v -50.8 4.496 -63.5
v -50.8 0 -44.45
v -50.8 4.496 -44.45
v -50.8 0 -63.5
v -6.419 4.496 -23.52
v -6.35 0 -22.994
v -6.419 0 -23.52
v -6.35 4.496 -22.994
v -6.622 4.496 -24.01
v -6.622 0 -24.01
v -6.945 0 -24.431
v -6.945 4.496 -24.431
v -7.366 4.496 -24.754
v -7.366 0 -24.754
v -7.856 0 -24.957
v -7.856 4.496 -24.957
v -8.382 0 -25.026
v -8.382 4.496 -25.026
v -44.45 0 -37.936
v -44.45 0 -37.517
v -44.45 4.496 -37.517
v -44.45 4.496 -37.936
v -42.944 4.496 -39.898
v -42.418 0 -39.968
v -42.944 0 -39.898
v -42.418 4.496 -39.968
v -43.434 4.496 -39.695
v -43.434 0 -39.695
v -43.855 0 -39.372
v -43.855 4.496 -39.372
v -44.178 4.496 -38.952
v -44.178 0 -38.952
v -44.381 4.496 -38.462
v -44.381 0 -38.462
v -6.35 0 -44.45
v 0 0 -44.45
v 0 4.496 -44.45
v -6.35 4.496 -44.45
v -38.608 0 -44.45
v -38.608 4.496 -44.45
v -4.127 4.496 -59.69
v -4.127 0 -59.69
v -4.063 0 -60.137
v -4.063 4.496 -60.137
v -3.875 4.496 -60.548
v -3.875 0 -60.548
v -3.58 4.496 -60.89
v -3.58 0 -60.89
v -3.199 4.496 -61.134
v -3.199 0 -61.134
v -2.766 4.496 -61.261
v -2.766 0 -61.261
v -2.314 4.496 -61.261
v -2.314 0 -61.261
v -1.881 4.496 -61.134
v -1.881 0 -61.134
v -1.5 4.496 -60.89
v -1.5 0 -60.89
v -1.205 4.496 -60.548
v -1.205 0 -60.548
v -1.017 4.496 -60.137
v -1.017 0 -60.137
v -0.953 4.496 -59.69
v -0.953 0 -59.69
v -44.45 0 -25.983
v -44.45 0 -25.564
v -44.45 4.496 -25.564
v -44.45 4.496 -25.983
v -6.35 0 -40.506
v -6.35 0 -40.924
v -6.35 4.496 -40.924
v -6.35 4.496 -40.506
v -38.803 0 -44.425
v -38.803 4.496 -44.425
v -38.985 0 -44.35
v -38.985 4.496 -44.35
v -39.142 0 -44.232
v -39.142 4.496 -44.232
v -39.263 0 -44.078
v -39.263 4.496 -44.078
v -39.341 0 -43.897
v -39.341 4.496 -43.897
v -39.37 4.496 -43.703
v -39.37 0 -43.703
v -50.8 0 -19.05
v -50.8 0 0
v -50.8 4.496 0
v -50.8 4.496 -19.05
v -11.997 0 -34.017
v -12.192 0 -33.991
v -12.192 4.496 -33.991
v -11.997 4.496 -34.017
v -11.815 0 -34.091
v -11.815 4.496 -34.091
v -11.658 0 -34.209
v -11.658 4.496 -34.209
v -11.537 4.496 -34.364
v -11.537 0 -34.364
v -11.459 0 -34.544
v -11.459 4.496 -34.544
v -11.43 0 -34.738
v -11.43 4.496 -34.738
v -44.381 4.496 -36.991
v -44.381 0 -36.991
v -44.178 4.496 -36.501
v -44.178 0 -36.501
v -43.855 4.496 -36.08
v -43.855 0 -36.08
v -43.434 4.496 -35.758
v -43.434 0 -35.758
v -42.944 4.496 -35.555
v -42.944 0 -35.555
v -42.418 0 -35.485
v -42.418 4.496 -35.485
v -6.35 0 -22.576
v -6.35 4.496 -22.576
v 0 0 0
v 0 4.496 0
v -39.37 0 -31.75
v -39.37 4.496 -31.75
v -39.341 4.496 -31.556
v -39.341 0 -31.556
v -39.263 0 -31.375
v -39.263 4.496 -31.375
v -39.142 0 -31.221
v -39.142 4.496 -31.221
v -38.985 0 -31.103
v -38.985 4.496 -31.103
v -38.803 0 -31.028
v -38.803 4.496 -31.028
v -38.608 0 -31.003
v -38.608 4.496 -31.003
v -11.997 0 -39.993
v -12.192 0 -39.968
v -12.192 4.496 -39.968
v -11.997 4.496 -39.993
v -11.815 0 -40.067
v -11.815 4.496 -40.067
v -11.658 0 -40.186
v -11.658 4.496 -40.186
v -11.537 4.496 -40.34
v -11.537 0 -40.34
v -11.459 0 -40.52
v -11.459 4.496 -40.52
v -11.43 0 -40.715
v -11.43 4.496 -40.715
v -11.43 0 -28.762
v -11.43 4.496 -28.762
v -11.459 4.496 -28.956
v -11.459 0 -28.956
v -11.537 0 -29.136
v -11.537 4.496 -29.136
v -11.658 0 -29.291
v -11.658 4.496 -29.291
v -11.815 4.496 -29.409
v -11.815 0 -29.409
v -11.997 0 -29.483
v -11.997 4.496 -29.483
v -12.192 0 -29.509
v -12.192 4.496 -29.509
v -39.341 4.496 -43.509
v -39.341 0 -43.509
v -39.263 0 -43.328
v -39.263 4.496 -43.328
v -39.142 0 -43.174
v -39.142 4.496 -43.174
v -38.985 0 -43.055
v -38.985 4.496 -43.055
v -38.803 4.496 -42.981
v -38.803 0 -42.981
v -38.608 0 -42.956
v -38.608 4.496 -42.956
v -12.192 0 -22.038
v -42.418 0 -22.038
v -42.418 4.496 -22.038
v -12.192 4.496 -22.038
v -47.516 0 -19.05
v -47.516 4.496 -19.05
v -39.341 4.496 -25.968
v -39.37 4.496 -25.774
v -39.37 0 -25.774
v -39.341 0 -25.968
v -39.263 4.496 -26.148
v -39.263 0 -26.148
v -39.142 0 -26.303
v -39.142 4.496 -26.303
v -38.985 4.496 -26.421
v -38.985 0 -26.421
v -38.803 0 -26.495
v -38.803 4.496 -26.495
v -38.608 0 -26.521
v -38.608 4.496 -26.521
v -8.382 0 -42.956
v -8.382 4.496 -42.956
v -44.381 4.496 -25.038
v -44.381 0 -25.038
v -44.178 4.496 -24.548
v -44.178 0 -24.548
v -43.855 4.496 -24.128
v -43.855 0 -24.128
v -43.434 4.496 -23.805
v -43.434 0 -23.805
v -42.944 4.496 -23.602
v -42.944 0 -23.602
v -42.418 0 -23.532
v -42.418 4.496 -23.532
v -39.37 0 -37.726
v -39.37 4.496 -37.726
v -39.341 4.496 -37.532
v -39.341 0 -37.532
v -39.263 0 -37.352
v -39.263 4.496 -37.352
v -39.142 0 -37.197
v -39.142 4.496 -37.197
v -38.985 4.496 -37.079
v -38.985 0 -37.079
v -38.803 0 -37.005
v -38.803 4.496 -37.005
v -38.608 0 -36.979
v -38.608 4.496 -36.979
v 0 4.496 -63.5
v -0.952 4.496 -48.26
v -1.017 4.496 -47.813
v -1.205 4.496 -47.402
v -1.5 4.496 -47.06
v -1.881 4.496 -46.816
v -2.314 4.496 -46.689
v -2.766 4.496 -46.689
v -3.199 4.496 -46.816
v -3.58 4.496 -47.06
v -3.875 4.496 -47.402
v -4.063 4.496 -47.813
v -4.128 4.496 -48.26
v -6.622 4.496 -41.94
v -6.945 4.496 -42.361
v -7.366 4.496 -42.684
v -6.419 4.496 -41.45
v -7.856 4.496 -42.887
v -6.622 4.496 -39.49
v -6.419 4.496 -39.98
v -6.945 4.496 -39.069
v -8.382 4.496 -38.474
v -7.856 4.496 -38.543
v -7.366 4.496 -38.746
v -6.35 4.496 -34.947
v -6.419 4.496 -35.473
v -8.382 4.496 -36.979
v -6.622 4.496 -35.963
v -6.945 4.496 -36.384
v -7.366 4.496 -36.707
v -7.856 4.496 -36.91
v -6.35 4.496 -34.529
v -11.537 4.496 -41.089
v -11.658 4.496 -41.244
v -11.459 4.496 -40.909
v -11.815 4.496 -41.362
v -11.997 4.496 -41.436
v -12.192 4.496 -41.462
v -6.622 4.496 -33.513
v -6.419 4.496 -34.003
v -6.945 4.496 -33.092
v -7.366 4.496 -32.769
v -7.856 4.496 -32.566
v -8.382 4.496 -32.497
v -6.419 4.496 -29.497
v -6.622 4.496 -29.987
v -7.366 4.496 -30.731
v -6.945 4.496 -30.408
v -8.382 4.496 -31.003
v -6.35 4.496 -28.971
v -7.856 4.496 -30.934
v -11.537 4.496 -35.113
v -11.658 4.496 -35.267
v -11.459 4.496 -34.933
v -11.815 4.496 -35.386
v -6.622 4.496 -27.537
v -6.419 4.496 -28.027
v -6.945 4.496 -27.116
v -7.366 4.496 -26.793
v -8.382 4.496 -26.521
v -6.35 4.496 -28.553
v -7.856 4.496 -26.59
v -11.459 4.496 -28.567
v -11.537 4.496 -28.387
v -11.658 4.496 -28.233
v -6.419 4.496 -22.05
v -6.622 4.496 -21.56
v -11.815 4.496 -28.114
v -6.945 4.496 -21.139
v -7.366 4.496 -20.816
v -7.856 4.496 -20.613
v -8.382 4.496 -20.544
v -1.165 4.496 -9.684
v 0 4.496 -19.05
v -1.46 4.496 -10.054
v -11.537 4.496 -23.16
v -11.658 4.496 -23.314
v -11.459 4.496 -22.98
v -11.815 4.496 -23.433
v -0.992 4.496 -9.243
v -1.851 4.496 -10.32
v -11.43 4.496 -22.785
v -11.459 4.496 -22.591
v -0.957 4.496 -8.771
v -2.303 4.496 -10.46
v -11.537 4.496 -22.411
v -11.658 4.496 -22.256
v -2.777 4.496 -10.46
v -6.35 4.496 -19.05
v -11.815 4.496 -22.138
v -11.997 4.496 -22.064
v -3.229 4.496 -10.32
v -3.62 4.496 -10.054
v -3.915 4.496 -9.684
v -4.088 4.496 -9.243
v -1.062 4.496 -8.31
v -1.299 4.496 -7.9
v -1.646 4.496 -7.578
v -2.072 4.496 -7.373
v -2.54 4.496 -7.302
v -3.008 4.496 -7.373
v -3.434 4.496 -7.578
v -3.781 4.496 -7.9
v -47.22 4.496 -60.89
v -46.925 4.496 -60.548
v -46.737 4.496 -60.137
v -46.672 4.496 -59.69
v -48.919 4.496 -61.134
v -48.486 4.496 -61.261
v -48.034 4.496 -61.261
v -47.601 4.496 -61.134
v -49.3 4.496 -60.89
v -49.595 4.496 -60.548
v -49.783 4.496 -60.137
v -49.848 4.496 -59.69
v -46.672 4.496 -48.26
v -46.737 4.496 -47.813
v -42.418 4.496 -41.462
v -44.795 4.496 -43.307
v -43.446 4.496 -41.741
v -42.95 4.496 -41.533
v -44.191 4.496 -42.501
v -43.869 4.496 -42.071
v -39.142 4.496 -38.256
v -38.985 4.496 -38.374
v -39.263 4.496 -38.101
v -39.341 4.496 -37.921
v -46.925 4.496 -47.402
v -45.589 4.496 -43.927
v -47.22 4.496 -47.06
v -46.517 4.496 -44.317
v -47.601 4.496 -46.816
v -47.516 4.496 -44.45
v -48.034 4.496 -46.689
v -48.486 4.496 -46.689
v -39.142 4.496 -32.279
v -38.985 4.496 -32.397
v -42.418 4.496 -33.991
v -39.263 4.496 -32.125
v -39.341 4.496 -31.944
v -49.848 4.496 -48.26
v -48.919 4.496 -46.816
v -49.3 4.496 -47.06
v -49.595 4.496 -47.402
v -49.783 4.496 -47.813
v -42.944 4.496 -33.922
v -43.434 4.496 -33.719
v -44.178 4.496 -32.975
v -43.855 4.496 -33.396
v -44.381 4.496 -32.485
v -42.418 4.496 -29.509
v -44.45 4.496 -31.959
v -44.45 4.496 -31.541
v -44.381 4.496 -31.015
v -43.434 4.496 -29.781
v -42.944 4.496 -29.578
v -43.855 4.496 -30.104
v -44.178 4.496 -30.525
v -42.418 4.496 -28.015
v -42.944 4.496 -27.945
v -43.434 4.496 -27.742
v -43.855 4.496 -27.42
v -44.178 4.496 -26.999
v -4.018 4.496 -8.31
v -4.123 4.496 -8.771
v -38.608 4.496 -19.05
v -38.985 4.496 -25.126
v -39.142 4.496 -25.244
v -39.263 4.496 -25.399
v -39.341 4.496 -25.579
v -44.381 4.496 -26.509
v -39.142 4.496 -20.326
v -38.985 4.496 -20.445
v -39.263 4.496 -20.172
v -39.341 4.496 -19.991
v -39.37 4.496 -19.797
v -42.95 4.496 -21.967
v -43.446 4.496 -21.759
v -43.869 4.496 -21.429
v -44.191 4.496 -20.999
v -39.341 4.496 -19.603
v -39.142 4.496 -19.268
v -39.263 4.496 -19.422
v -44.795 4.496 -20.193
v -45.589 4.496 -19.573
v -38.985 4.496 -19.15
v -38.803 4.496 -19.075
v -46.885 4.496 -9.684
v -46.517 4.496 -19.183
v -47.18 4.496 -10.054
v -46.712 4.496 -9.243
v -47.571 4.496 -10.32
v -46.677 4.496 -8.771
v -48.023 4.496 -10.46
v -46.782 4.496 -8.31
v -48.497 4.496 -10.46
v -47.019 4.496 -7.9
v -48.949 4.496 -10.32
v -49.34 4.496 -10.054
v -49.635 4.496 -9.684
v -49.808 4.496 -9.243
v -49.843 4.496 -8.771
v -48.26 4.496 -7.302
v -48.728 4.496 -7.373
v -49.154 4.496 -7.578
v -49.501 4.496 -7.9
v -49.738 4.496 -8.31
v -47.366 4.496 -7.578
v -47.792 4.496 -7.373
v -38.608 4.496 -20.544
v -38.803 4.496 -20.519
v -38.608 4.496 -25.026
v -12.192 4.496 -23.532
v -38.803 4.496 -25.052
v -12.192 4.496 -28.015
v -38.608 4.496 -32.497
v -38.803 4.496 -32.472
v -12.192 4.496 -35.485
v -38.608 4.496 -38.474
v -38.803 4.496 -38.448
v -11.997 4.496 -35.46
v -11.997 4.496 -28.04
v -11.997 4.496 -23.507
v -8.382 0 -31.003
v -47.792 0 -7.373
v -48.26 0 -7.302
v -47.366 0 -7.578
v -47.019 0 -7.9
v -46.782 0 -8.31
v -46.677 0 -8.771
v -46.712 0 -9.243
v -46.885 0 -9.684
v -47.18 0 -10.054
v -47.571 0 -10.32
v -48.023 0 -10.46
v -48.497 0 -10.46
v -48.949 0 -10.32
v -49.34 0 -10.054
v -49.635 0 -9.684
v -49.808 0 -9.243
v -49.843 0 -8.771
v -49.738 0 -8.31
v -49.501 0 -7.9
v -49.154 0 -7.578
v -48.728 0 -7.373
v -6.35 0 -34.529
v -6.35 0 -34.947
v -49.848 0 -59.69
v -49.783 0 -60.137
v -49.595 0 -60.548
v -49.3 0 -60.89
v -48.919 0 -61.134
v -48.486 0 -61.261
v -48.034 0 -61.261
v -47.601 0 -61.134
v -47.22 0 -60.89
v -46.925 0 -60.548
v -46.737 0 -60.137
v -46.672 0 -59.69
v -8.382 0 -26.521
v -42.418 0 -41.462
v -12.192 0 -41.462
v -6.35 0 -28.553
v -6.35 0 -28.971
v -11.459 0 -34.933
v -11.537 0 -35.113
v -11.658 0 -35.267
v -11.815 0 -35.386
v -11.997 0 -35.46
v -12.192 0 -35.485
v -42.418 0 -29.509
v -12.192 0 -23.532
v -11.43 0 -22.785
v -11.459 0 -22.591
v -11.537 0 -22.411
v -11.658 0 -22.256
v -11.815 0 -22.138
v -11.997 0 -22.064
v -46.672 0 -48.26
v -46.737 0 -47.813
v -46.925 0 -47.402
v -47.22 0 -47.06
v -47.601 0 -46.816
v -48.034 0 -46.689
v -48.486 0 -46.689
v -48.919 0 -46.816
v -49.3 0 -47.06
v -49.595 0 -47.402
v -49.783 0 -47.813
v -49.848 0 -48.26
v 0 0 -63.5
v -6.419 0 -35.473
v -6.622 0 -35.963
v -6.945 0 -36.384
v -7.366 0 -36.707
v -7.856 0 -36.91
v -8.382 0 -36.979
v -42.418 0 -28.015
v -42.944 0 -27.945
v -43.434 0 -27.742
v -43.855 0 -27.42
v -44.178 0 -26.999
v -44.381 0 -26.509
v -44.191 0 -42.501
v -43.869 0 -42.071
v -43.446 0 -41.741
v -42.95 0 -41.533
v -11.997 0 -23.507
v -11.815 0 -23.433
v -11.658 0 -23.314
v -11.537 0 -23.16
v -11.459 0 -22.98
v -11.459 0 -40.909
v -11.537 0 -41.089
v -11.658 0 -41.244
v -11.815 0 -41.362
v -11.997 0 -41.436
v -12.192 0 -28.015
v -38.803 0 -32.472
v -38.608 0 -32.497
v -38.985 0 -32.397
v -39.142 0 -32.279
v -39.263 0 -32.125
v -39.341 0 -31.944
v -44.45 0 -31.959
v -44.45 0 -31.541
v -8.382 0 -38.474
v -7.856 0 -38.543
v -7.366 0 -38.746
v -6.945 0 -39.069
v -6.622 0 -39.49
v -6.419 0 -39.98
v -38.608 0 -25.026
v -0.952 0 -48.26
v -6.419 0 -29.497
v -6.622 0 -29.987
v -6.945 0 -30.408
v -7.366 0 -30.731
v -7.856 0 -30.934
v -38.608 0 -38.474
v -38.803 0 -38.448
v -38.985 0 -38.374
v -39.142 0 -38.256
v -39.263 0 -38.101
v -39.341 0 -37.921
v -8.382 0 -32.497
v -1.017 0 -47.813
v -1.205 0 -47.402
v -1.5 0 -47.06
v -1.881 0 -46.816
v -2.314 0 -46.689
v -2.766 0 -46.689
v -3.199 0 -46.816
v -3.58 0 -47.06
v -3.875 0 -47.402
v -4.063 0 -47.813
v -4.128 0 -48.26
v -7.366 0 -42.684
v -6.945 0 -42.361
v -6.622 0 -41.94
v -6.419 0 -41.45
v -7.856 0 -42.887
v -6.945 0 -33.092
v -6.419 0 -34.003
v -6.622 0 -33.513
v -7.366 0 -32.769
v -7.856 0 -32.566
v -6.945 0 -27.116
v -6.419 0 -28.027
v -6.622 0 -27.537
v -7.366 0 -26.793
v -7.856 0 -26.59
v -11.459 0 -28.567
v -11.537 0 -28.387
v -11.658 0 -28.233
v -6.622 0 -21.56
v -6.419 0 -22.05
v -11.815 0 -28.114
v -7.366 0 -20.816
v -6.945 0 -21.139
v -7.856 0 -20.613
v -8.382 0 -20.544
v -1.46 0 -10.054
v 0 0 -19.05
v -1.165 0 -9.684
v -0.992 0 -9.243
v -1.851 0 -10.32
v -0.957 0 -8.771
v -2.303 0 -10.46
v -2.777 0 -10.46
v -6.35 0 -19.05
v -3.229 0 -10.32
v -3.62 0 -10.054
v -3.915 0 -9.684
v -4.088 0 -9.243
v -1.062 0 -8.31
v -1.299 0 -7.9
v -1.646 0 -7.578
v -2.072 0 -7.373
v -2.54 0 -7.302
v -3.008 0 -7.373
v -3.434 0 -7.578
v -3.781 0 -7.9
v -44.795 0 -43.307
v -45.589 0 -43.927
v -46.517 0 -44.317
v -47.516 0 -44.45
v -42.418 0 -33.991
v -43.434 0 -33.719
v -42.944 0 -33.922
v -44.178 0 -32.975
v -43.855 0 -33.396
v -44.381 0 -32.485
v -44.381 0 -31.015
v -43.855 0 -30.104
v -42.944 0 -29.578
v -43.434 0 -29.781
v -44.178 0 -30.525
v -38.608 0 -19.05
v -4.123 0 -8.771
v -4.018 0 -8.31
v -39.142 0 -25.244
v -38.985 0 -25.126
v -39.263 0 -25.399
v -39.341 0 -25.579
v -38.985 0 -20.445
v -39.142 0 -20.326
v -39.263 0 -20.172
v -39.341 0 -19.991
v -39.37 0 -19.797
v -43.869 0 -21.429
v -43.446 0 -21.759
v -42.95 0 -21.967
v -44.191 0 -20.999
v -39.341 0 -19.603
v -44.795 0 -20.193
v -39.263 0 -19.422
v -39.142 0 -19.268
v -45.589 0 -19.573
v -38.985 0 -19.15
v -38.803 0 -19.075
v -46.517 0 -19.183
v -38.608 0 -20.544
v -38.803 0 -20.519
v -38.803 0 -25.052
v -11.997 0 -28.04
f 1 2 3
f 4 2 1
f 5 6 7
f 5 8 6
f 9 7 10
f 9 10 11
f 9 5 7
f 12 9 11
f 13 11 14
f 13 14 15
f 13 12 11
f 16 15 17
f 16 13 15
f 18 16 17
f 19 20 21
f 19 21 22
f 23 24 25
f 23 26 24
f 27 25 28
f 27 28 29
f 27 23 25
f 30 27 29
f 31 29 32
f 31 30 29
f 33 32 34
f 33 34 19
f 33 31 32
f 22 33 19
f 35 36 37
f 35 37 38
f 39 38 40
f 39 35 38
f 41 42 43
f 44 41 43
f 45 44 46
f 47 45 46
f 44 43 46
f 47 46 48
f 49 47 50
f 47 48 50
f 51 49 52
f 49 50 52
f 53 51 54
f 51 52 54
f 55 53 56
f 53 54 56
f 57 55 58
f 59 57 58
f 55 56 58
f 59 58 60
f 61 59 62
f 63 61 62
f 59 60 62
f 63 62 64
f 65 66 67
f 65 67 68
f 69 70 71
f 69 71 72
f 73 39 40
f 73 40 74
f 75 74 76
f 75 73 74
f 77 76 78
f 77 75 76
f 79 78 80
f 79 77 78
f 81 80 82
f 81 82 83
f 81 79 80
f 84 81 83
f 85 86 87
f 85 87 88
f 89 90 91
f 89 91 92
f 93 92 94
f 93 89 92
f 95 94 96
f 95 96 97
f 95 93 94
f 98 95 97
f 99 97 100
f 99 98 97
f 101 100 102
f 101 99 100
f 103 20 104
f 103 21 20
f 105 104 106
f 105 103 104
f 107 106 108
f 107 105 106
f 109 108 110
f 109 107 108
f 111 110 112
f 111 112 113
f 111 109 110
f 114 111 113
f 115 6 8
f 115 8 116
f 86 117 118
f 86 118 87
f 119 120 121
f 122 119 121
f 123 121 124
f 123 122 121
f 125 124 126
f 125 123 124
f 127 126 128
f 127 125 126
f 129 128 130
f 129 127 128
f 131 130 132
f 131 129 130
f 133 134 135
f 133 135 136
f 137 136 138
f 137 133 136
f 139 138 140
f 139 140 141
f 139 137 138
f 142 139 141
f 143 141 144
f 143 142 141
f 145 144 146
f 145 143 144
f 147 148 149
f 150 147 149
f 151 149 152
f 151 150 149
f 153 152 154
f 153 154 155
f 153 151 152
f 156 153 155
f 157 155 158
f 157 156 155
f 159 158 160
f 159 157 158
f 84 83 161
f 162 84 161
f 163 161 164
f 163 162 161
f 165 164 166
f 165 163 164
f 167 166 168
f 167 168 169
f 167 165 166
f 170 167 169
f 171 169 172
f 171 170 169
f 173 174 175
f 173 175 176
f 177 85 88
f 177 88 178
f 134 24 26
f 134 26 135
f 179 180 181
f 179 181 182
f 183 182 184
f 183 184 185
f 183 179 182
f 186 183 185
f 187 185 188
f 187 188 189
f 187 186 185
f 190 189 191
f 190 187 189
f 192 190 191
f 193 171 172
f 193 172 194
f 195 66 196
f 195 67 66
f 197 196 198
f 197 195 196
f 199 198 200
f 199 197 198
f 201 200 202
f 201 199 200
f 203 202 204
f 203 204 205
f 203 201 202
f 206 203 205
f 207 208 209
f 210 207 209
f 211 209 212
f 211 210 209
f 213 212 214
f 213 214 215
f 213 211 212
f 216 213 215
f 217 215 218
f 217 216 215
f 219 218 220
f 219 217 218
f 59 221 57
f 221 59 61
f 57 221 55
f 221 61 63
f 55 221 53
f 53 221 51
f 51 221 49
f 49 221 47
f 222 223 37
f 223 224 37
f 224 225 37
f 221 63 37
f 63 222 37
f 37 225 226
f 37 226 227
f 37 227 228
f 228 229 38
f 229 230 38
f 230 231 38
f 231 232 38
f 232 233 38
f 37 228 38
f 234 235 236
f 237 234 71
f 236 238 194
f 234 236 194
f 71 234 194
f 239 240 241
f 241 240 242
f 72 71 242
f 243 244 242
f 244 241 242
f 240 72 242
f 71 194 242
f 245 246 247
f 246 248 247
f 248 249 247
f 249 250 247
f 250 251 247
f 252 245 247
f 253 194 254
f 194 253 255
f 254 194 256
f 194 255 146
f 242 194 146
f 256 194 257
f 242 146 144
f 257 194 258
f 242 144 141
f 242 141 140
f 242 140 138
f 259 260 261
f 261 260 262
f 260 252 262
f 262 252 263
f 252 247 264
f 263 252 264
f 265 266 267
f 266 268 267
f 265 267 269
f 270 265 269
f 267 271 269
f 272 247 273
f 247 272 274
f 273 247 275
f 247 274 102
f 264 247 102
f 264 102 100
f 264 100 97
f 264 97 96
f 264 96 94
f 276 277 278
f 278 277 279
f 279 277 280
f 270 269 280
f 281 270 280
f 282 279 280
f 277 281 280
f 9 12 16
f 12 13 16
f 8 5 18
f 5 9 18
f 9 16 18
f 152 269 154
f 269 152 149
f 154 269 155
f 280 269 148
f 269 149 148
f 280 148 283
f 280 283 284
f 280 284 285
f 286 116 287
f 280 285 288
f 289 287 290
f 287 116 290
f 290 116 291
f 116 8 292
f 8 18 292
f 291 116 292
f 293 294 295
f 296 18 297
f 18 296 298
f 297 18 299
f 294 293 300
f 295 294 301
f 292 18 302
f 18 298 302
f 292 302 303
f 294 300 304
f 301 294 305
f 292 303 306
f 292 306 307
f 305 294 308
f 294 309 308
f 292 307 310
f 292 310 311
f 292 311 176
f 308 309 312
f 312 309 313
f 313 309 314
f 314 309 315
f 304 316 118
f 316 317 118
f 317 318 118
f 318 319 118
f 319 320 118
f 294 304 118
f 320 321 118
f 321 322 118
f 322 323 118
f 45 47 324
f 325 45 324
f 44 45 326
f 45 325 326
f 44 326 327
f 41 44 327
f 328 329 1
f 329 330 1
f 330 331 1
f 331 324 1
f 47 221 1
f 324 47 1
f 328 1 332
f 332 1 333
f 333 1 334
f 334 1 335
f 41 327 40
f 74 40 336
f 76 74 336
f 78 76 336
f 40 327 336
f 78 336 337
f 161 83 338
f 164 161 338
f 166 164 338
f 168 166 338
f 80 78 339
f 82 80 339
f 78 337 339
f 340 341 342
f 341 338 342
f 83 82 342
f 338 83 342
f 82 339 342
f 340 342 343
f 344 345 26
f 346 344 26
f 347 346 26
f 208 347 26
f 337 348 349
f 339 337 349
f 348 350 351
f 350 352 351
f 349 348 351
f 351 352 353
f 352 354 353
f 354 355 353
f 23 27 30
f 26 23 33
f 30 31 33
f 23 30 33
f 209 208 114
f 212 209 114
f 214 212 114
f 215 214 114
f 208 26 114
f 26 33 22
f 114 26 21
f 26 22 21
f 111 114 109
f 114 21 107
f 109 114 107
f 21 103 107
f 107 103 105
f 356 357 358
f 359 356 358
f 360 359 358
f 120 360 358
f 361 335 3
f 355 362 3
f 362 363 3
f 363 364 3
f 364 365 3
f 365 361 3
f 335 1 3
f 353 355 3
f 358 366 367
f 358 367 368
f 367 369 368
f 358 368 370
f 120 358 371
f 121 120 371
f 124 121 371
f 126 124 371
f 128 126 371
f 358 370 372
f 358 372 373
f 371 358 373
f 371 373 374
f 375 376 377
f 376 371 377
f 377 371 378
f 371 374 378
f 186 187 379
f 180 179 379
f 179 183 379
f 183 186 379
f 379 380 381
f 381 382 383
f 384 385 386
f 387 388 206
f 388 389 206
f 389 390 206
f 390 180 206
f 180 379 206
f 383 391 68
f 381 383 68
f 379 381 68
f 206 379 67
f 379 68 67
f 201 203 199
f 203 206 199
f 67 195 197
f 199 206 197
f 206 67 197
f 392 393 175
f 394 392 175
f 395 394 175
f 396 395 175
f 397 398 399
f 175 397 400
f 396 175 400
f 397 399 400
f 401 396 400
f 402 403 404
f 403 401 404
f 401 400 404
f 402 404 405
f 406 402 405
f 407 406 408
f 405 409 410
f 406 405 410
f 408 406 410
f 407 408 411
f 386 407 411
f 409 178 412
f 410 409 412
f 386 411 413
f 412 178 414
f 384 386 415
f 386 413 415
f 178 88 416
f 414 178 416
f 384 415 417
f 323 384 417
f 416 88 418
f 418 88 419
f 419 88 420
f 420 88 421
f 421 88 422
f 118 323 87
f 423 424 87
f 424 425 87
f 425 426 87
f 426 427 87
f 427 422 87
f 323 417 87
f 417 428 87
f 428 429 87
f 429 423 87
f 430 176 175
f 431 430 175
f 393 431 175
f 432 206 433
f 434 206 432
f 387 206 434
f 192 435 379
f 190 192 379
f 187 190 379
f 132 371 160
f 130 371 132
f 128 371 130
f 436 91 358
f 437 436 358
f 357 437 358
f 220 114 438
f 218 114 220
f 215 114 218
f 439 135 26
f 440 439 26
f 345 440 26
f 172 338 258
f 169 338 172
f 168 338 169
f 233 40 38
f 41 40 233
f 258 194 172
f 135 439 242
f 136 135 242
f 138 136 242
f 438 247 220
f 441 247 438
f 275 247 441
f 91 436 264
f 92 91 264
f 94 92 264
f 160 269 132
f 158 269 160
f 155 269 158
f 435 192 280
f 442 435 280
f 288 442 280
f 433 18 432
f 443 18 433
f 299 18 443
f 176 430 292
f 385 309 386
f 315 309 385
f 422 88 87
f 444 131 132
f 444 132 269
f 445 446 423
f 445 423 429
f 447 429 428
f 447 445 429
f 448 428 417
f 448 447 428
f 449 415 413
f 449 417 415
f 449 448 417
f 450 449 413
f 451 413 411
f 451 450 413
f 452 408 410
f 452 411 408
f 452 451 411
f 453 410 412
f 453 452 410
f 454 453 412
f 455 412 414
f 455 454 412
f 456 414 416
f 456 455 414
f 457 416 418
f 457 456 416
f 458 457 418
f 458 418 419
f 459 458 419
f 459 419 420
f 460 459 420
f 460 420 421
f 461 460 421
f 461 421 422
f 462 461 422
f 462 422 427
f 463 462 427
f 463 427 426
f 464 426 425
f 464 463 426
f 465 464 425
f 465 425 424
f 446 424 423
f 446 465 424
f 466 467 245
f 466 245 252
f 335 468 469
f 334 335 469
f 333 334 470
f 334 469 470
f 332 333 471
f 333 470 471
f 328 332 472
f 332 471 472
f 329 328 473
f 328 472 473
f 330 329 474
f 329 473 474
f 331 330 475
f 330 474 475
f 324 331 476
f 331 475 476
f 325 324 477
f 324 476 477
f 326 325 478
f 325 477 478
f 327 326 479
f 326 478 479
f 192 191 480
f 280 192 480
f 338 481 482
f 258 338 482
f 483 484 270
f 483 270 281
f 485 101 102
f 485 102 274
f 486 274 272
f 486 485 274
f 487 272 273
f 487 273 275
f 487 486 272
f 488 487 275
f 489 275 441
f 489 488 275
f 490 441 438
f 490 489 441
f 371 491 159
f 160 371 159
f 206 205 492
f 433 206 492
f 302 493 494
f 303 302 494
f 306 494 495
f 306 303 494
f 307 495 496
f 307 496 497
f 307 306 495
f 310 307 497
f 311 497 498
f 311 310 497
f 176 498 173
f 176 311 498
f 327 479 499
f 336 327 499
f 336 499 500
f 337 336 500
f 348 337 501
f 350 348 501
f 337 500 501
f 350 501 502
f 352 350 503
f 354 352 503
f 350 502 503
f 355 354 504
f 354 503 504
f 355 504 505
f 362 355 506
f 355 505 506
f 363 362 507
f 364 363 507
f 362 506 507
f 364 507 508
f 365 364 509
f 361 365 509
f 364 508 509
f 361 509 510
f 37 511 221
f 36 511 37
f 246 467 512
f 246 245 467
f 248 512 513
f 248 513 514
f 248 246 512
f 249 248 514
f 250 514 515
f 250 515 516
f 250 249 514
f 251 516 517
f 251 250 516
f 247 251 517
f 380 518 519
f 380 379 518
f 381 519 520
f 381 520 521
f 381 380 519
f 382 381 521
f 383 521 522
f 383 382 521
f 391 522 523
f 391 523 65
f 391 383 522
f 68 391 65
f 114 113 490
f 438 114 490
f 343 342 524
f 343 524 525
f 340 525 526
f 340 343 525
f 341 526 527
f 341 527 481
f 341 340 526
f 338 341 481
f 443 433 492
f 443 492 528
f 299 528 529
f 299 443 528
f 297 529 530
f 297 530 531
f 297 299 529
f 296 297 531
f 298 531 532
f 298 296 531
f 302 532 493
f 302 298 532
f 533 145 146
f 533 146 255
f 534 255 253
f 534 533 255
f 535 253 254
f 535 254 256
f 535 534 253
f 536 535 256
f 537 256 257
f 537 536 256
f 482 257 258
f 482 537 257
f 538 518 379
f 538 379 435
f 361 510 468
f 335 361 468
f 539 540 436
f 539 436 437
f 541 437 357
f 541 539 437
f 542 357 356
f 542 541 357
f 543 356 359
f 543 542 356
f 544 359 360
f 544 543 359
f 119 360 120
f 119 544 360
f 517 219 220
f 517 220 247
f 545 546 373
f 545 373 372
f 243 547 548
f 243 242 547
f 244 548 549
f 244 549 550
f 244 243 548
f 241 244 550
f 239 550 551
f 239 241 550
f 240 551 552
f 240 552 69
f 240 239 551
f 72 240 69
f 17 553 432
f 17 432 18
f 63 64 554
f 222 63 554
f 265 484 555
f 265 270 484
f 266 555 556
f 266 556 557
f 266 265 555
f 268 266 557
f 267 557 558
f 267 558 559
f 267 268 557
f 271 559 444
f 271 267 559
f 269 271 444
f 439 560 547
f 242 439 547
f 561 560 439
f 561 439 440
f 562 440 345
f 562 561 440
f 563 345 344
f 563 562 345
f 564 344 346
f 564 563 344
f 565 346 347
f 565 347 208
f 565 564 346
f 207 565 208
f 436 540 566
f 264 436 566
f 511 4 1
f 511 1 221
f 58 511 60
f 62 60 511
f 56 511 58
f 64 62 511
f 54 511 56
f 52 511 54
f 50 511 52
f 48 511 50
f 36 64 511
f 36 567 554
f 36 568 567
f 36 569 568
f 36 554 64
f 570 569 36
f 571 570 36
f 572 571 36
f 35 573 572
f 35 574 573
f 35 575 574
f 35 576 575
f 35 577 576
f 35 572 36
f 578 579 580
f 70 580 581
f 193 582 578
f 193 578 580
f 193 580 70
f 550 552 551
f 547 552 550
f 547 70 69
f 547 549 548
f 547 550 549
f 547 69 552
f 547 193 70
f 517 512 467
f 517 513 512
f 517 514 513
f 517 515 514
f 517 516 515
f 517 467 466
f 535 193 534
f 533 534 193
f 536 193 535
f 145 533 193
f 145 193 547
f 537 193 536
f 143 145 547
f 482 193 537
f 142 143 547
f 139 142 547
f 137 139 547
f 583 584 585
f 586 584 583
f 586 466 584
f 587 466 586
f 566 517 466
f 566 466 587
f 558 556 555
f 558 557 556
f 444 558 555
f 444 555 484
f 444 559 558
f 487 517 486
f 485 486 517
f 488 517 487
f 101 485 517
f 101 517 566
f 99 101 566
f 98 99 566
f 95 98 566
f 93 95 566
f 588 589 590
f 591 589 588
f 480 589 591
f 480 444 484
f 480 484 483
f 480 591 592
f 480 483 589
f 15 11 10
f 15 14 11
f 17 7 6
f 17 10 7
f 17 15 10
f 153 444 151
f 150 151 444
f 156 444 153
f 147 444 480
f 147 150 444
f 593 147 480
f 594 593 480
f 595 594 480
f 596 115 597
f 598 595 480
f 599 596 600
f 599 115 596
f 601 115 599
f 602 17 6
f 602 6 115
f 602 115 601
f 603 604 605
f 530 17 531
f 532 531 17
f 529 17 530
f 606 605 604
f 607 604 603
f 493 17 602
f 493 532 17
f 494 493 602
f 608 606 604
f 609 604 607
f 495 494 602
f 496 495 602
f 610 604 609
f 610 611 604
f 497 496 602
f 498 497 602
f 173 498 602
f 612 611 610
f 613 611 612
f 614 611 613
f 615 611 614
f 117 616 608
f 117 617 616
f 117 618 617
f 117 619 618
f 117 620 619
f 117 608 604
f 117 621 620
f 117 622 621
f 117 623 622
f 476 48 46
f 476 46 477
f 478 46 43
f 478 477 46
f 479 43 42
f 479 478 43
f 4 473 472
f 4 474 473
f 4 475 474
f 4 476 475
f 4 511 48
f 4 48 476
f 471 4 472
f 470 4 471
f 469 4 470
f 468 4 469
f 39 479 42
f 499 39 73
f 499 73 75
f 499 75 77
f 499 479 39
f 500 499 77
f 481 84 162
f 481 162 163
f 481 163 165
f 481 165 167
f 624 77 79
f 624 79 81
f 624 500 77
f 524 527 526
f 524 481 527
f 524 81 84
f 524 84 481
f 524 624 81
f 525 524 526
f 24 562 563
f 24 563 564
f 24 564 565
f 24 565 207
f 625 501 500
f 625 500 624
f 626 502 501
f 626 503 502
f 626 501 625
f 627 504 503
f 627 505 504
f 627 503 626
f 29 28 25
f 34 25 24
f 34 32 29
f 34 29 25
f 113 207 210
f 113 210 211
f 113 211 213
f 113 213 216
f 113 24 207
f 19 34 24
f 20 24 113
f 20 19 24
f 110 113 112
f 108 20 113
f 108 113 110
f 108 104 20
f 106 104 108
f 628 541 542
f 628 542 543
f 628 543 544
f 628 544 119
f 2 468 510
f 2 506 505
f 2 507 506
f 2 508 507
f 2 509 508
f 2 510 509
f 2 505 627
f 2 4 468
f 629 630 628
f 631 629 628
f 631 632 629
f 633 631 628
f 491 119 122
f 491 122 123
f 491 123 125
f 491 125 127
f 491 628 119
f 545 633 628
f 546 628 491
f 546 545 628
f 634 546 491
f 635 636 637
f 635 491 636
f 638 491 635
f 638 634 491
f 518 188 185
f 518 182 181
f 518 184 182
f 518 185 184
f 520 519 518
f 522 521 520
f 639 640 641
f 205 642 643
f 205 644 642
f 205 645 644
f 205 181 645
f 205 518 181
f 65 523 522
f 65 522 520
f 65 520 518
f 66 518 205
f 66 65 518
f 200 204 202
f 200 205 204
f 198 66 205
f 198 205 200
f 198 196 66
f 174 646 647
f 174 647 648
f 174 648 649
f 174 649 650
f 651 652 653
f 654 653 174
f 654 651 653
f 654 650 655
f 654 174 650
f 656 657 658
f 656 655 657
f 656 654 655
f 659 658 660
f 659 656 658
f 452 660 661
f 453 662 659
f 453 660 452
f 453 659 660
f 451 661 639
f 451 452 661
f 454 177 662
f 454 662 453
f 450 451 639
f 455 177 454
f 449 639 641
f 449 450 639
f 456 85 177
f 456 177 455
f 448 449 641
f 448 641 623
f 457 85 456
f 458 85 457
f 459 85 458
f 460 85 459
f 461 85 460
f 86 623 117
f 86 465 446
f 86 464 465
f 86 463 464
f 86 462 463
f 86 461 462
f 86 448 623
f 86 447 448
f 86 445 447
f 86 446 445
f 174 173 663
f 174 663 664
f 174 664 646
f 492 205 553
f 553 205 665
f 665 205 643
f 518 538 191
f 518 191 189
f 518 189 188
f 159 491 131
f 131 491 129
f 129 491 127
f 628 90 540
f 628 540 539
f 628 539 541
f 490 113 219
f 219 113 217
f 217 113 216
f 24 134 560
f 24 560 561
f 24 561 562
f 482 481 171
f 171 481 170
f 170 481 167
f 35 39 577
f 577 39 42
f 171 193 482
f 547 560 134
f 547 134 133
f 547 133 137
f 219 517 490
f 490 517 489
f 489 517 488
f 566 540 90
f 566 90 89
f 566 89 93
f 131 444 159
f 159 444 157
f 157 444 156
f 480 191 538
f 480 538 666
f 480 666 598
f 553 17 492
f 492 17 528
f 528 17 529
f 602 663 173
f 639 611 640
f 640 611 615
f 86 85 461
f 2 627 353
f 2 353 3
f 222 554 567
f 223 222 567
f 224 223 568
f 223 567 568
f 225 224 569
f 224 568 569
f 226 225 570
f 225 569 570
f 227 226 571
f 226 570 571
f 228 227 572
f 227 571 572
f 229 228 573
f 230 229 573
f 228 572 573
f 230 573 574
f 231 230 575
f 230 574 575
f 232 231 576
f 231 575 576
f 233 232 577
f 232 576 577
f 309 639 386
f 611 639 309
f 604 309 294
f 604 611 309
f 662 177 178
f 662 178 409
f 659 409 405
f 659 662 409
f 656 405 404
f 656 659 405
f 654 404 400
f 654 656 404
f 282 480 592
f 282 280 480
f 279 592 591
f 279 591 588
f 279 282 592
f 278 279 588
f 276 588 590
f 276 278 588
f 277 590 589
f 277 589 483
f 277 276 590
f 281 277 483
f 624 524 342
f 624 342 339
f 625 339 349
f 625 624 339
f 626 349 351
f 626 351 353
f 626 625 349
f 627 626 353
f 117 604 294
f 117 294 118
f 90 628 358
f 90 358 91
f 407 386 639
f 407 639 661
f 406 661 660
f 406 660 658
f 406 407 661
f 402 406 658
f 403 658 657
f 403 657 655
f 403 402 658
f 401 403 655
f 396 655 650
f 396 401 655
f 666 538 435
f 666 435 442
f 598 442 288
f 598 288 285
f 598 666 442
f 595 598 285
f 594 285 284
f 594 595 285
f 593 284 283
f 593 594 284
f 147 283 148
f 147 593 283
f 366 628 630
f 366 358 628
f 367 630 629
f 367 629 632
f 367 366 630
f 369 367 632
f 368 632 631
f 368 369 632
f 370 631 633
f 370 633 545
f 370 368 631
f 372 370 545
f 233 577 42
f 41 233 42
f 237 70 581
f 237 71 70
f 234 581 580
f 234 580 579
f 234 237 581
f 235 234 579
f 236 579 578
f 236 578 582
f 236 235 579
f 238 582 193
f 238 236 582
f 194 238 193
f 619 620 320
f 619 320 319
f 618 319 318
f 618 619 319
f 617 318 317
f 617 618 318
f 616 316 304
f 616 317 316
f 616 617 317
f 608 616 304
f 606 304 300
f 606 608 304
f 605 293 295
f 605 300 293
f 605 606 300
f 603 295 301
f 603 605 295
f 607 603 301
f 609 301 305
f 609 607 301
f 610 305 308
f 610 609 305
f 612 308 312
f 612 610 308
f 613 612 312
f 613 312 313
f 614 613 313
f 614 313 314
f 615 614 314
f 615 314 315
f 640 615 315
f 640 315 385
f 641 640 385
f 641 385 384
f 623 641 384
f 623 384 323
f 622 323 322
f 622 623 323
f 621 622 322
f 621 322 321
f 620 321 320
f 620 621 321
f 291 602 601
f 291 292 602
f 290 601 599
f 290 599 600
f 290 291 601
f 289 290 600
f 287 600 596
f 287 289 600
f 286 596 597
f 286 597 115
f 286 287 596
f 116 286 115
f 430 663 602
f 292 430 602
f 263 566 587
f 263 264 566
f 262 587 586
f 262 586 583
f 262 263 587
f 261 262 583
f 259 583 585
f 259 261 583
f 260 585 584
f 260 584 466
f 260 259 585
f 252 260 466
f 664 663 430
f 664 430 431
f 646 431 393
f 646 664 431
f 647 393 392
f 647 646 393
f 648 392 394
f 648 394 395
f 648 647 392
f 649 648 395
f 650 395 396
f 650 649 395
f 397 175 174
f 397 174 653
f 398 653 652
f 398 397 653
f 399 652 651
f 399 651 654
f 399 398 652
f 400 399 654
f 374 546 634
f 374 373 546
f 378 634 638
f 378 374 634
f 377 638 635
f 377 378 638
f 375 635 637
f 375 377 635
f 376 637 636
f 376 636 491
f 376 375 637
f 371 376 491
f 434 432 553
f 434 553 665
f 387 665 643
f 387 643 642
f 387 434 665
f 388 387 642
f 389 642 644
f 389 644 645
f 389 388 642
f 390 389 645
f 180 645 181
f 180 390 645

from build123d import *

# Parameters (mm, degrees)
BOSS_EXTRUDE1_DEPTH     = 4.4958
CUT_EXTRUDE1_DEPTH      = 82.4438593
CUT_EXTRUDE1_DEPTH_BACK = 82.4438593
SKETCH3_R               = 1.5875
CUT_EXTRUDE2_DEPTH      = 82.4438593
CUT_EXTRUDE2_DEPTH_BACK = 82.4438593
SKETCH4_W               = 33.02
SKETCH4_H               = 1.494117647
SKETCH4_H_2             = 1.494117648
FILLET1_R               = 0.762
FILLET2_R               = 2.032
FILLET3_R               = 3.81
FILLET4_R               = 3.81


with BuildPart() as part:
    # Sketch1 → Boss-Extrude1 (new body)
    with BuildSketch(Plane(origin=(0, 0, 0), x_dir=(1, 0, 0), z_dir=(0, 1, 0))):
        Polygon((-50.8, 63.5), (0, 63.5), (0, 44.45), (-6.35, 44.45), (-6.35, 19.05), (0, 19.05), (0, 0), (-50.8, 0), (-50.8, 19.05), (-44.45, 19.05), (-44.45, 44.45), (-50.8, 44.45), align=None)
    extrude(amount=BOSS_EXTRUDE1_DEPTH)

    # Sketch3 → Cut-Extrude1 (cut, two sides: drawn at the far end of the back side and taken through both)
    with BuildSketch(Plane(origin=(0, 4.4958, 0), x_dir=(1, 0, 0), z_dir=(0, 1, 0)).offset(-CUT_EXTRUDE1_DEPTH_BACK)):
        with Locations(Location((-48.26, 8.89, 0), (0, 0, 270))):
            Circle(SKETCH3_R)
        with Locations(Location((-2.54, 8.89, 0), (0, 0, 270))):
            Circle(SKETCH3_R)
        with BuildLine():
            Line((-49.8475, 48.26), (-49.8475, 59.69))
            ThreePointArc((-49.8475, 59.69), (-48.26, 61.2775), (-46.6725, 59.69))
            Line((-46.6725, 59.69), (-46.6725, 48.26))
            ThreePointArc((-46.6725, 48.26), (-48.26, 46.6725), (-49.8475, 48.26))
        make_face()
        with BuildLine():
            Line((-4.1275, 48.26), (-4.1275, 59.69))
            ThreePointArc((-4.1275, 59.69), (-2.54, 61.2775), (-0.9525, 59.69))
            Line((-0.9525, 59.69), (-0.9525, 48.26))
            ThreePointArc((-0.9525, 48.26), (-2.54, 46.6725), (-4.1275, 48.26))
        make_face()
    extrude(amount=CUT_EXTRUDE1_DEPTH + CUT_EXTRUDE1_DEPTH_BACK, mode=Mode.SUBTRACT)

    # Sketch4 → Cut-Extrude2 (cut, two sides: drawn at the far end of the back side and taken through both)
    with BuildSketch(Plane(origin=(0, 4.4958, 0), x_dir=(1, 0, 0), z_dir=(0, 1, 0)).offset(-CUT_EXTRUDE2_DEPTH_BACK)):
        with Locations((-27.94, 34.738235295)):
            Rectangle(SKETCH4_W, SKETCH4_H)
        with Locations((-22.86, 19.797058824)):
            Rectangle(SKETCH4_W, SKETCH4_H)
        with Locations((-27.94, 22.785294118)):
            Rectangle(SKETCH4_W, SKETCH4_H)
        with Locations((-22.86, 25.773529412)):
            Rectangle(SKETCH4_W, SKETCH4_H)
        with Locations((-27.94, 28.761764705)):
            Rectangle(SKETCH4_W, SKETCH4_H)
        with Locations((-22.86, 31.75)):
            Rectangle(SKETCH4_W, SKETCH4_H_2)
        with Locations((-22.86, 37.726470589)):
            Rectangle(SKETCH4_W, SKETCH4_H)
        with Locations((-27.94, 40.714705882)):
            Rectangle(SKETCH4_W, SKETCH4_H)
        with Locations((-22.86, 43.702941177)):
            Rectangle(SKETCH4_W, SKETCH4_H)
    extrude(amount=CUT_EXTRUDE2_DEPTH + CUT_EXTRUDE2_DEPTH_BACK, mode=Mode.SUBTRACT)

    # Fillet1
    # the kernel refuses this fillet: 0.762 mm, written as the material it adds along each edge
    with BuildSketch(Plane(origin=(-39.37, 0, -32.497058824), x_dir=(0, 0, 1), z_dir=(0, 1, 0)), Plane(origin=(-11.43, 0, -29.508823529), x_dir=(-1, 0, 0), z_dir=(0, 1, 0)), Plane(origin=(-11.43, 0, -28.014705882), x_dir=(0, 0, -1), z_dir=(0, 1, 0)), Plane(origin=(-39.37, 0, -31.002941176), x_dir=(1, 0, 0), z_dir=(0, 1, 0)), Plane(origin=(-39.37, 0, -20.544117647), x_dir=(0, 0, 1), z_dir=(0, 1, 0)), Plane(origin=(-39.37, 0, -36.979411765), x_dir=(1, 0, 0), z_dir=(0, 1, 0)), Plane(origin=(-39.37, 0, -42.955882353), x_dir=(1, 0, 0), z_dir=(0, 1, 0)), Plane(origin=(-39.37, 0, -38.473529412), x_dir=(0, 0, 1), z_dir=(0, 1, 0)), Plane(origin=(-39.37, 0, -44.45), x_dir=(0, 0, 1), z_dir=(0, 1, 0)), Plane(origin=(-11.43, 0, -33.991176471), x_dir=(0, 0, -1), z_dir=(0, 1, 0)), Plane(origin=(-11.43, 0, -39.967647059), x_dir=(0, 0, -1), z_dir=(0, 1, 0)), Plane(origin=(-11.43, 0, -35.485294118), x_dir=(-1, 0, 0), z_dir=(0, 1, 0)), Plane(origin=(-11.43, 0, -41.461764706), x_dir=(-1, 0, 0), z_dir=(0, 1, 0))) as fillet1_piece_1:
        with BuildLine():
            CenterArc((FILLET1_R, FILLET1_R), FILLET1_R, 180, 90)
            Line((0, FILLET1_R), (0, 0))
            Line((0, 0), (FILLET1_R, 0))
        make_face()
    extrude(amount=4.4958)
    with BuildSketch(Plane(origin=(-11.43, 4.4958, -22.038235294), x_dir=(0, 0, -1), z_dir=(0, -1, 0)), Plane(origin=(-11.43, 4.4958, -23.532352941), x_dir=(-1, 0, 0), z_dir=(0, -1, 0)), Plane(origin=(-39.37, 4.4958, -25.026470588), x_dir=(1, 0, 0), z_dir=(0, -1, 0)), Plane(origin=(-39.37, 4.4958, -26.520588235), x_dir=(0, 0, 1), z_dir=(0, -1, 0)), Plane(origin=(-39.37, 4.4958, -19.05), x_dir=(1, 0, 0), z_dir=(0, -1, 0))) as fillet1_piece_2:
        with BuildLine():
            CenterArc((FILLET1_R, -FILLET1_R), FILLET1_R, 90, 90)
            Line((0, -FILLET1_R), (0, 0))
            Line((0, 0), (FILLET1_R, 0))
        make_face()
    extrude(amount=4.4958)

    # Fillet2
    fillet2_edges = [part.edges().sort_by_distance(p)[0] for p in [
        (-6.35, 2.2479, -26.520588235),
        (-6.35, 2.2479, -25.026470588),
        (-44.45, 2.2479, -22.038235294),
        (-44.45, 2.2479, -23.532352941),
        (-44.45, 2.2479, -28.014705882),
        (-44.45, 2.2479, -29.508823529),
        (-6.35, 2.2479, -32.497058824),
        (-6.35, 2.2479, -31.002941176),
        (-44.45, 2.2479, -33.991176471),
        (-44.45, 2.2479, -35.485294118),
        (-6.35, 2.2479, -38.473529412),
        (-6.35, 2.2479, -36.979411765),
        (-44.45, 2.2479, -39.967647059),
        (-44.45, 2.2479, -41.461764706),
        (-6.35, 2.2479, -42.955882353),
        (-6.35, 2.2479, -20.544117647),
    ]]
    fillet(fillet2_edges, radius=FILLET2_R)

    # Fillet3
    # the kernel refuses this fillet: 3.81 mm, written as the material it adds along each edge
    with BuildSketch(Plane(origin=(-44.45, 0, -44.45), x_dir=(-1, 0, 0), z_dir=(0, 1, 0))) as fillet3_piece_1:
        with BuildLine():
            CenterArc((3.065547548, 3.81), FILLET3_R, 209.241450743, 60.758549257)
            Line((-0.258939983, 1.948849105), (-0.591388736, 1.762734015))
            ThreePointArc((-0.591388736, 1.762734015), (-0.381, 0.956235294), (-0.381, 0))
            Line((-0.381, 0), (0, -0.381))
            Line((0, -0.381), (3.065547548, -0.381))
            Line((3.065547548, -0.381), (3.065547548, 0))
        make_face()
    extrude(amount=4.4958)

    # Fillet4
    # the kernel refuses this fillet: 3.81 mm, written as the material it adds along each edge
    with BuildSketch(Plane(origin=(-44.45, 0, -19.05), x_dir=(0.1317106342839345, 0, -0.9912882067373362), z_dir=(0, 1, 0))) as fillet4_piece_1:
        with BuildLine():
            CenterArc((3.373042856, 3.540658648), FILLET4_R, 187.568454523, 60.758549257)
            Line((-0.403765212, 3.038841131), (-0.781446019, 2.98865938))
            Line((-0.781446019, 2.98865938), (-0.377680807, -0.050181752))
            Line((-0.377680807, -0.050181752), (0.050181752, -0.377680807))
            ThreePointArc((0.050181752, -0.377680807), (0.998086522, -0.25173445), (1.825269627, -0.354065865))
            Line((1.825269627, -0.354065865), (1.965976284, 0))
        make_face()
    extrude(amount=4.4958)


solid = part.part
